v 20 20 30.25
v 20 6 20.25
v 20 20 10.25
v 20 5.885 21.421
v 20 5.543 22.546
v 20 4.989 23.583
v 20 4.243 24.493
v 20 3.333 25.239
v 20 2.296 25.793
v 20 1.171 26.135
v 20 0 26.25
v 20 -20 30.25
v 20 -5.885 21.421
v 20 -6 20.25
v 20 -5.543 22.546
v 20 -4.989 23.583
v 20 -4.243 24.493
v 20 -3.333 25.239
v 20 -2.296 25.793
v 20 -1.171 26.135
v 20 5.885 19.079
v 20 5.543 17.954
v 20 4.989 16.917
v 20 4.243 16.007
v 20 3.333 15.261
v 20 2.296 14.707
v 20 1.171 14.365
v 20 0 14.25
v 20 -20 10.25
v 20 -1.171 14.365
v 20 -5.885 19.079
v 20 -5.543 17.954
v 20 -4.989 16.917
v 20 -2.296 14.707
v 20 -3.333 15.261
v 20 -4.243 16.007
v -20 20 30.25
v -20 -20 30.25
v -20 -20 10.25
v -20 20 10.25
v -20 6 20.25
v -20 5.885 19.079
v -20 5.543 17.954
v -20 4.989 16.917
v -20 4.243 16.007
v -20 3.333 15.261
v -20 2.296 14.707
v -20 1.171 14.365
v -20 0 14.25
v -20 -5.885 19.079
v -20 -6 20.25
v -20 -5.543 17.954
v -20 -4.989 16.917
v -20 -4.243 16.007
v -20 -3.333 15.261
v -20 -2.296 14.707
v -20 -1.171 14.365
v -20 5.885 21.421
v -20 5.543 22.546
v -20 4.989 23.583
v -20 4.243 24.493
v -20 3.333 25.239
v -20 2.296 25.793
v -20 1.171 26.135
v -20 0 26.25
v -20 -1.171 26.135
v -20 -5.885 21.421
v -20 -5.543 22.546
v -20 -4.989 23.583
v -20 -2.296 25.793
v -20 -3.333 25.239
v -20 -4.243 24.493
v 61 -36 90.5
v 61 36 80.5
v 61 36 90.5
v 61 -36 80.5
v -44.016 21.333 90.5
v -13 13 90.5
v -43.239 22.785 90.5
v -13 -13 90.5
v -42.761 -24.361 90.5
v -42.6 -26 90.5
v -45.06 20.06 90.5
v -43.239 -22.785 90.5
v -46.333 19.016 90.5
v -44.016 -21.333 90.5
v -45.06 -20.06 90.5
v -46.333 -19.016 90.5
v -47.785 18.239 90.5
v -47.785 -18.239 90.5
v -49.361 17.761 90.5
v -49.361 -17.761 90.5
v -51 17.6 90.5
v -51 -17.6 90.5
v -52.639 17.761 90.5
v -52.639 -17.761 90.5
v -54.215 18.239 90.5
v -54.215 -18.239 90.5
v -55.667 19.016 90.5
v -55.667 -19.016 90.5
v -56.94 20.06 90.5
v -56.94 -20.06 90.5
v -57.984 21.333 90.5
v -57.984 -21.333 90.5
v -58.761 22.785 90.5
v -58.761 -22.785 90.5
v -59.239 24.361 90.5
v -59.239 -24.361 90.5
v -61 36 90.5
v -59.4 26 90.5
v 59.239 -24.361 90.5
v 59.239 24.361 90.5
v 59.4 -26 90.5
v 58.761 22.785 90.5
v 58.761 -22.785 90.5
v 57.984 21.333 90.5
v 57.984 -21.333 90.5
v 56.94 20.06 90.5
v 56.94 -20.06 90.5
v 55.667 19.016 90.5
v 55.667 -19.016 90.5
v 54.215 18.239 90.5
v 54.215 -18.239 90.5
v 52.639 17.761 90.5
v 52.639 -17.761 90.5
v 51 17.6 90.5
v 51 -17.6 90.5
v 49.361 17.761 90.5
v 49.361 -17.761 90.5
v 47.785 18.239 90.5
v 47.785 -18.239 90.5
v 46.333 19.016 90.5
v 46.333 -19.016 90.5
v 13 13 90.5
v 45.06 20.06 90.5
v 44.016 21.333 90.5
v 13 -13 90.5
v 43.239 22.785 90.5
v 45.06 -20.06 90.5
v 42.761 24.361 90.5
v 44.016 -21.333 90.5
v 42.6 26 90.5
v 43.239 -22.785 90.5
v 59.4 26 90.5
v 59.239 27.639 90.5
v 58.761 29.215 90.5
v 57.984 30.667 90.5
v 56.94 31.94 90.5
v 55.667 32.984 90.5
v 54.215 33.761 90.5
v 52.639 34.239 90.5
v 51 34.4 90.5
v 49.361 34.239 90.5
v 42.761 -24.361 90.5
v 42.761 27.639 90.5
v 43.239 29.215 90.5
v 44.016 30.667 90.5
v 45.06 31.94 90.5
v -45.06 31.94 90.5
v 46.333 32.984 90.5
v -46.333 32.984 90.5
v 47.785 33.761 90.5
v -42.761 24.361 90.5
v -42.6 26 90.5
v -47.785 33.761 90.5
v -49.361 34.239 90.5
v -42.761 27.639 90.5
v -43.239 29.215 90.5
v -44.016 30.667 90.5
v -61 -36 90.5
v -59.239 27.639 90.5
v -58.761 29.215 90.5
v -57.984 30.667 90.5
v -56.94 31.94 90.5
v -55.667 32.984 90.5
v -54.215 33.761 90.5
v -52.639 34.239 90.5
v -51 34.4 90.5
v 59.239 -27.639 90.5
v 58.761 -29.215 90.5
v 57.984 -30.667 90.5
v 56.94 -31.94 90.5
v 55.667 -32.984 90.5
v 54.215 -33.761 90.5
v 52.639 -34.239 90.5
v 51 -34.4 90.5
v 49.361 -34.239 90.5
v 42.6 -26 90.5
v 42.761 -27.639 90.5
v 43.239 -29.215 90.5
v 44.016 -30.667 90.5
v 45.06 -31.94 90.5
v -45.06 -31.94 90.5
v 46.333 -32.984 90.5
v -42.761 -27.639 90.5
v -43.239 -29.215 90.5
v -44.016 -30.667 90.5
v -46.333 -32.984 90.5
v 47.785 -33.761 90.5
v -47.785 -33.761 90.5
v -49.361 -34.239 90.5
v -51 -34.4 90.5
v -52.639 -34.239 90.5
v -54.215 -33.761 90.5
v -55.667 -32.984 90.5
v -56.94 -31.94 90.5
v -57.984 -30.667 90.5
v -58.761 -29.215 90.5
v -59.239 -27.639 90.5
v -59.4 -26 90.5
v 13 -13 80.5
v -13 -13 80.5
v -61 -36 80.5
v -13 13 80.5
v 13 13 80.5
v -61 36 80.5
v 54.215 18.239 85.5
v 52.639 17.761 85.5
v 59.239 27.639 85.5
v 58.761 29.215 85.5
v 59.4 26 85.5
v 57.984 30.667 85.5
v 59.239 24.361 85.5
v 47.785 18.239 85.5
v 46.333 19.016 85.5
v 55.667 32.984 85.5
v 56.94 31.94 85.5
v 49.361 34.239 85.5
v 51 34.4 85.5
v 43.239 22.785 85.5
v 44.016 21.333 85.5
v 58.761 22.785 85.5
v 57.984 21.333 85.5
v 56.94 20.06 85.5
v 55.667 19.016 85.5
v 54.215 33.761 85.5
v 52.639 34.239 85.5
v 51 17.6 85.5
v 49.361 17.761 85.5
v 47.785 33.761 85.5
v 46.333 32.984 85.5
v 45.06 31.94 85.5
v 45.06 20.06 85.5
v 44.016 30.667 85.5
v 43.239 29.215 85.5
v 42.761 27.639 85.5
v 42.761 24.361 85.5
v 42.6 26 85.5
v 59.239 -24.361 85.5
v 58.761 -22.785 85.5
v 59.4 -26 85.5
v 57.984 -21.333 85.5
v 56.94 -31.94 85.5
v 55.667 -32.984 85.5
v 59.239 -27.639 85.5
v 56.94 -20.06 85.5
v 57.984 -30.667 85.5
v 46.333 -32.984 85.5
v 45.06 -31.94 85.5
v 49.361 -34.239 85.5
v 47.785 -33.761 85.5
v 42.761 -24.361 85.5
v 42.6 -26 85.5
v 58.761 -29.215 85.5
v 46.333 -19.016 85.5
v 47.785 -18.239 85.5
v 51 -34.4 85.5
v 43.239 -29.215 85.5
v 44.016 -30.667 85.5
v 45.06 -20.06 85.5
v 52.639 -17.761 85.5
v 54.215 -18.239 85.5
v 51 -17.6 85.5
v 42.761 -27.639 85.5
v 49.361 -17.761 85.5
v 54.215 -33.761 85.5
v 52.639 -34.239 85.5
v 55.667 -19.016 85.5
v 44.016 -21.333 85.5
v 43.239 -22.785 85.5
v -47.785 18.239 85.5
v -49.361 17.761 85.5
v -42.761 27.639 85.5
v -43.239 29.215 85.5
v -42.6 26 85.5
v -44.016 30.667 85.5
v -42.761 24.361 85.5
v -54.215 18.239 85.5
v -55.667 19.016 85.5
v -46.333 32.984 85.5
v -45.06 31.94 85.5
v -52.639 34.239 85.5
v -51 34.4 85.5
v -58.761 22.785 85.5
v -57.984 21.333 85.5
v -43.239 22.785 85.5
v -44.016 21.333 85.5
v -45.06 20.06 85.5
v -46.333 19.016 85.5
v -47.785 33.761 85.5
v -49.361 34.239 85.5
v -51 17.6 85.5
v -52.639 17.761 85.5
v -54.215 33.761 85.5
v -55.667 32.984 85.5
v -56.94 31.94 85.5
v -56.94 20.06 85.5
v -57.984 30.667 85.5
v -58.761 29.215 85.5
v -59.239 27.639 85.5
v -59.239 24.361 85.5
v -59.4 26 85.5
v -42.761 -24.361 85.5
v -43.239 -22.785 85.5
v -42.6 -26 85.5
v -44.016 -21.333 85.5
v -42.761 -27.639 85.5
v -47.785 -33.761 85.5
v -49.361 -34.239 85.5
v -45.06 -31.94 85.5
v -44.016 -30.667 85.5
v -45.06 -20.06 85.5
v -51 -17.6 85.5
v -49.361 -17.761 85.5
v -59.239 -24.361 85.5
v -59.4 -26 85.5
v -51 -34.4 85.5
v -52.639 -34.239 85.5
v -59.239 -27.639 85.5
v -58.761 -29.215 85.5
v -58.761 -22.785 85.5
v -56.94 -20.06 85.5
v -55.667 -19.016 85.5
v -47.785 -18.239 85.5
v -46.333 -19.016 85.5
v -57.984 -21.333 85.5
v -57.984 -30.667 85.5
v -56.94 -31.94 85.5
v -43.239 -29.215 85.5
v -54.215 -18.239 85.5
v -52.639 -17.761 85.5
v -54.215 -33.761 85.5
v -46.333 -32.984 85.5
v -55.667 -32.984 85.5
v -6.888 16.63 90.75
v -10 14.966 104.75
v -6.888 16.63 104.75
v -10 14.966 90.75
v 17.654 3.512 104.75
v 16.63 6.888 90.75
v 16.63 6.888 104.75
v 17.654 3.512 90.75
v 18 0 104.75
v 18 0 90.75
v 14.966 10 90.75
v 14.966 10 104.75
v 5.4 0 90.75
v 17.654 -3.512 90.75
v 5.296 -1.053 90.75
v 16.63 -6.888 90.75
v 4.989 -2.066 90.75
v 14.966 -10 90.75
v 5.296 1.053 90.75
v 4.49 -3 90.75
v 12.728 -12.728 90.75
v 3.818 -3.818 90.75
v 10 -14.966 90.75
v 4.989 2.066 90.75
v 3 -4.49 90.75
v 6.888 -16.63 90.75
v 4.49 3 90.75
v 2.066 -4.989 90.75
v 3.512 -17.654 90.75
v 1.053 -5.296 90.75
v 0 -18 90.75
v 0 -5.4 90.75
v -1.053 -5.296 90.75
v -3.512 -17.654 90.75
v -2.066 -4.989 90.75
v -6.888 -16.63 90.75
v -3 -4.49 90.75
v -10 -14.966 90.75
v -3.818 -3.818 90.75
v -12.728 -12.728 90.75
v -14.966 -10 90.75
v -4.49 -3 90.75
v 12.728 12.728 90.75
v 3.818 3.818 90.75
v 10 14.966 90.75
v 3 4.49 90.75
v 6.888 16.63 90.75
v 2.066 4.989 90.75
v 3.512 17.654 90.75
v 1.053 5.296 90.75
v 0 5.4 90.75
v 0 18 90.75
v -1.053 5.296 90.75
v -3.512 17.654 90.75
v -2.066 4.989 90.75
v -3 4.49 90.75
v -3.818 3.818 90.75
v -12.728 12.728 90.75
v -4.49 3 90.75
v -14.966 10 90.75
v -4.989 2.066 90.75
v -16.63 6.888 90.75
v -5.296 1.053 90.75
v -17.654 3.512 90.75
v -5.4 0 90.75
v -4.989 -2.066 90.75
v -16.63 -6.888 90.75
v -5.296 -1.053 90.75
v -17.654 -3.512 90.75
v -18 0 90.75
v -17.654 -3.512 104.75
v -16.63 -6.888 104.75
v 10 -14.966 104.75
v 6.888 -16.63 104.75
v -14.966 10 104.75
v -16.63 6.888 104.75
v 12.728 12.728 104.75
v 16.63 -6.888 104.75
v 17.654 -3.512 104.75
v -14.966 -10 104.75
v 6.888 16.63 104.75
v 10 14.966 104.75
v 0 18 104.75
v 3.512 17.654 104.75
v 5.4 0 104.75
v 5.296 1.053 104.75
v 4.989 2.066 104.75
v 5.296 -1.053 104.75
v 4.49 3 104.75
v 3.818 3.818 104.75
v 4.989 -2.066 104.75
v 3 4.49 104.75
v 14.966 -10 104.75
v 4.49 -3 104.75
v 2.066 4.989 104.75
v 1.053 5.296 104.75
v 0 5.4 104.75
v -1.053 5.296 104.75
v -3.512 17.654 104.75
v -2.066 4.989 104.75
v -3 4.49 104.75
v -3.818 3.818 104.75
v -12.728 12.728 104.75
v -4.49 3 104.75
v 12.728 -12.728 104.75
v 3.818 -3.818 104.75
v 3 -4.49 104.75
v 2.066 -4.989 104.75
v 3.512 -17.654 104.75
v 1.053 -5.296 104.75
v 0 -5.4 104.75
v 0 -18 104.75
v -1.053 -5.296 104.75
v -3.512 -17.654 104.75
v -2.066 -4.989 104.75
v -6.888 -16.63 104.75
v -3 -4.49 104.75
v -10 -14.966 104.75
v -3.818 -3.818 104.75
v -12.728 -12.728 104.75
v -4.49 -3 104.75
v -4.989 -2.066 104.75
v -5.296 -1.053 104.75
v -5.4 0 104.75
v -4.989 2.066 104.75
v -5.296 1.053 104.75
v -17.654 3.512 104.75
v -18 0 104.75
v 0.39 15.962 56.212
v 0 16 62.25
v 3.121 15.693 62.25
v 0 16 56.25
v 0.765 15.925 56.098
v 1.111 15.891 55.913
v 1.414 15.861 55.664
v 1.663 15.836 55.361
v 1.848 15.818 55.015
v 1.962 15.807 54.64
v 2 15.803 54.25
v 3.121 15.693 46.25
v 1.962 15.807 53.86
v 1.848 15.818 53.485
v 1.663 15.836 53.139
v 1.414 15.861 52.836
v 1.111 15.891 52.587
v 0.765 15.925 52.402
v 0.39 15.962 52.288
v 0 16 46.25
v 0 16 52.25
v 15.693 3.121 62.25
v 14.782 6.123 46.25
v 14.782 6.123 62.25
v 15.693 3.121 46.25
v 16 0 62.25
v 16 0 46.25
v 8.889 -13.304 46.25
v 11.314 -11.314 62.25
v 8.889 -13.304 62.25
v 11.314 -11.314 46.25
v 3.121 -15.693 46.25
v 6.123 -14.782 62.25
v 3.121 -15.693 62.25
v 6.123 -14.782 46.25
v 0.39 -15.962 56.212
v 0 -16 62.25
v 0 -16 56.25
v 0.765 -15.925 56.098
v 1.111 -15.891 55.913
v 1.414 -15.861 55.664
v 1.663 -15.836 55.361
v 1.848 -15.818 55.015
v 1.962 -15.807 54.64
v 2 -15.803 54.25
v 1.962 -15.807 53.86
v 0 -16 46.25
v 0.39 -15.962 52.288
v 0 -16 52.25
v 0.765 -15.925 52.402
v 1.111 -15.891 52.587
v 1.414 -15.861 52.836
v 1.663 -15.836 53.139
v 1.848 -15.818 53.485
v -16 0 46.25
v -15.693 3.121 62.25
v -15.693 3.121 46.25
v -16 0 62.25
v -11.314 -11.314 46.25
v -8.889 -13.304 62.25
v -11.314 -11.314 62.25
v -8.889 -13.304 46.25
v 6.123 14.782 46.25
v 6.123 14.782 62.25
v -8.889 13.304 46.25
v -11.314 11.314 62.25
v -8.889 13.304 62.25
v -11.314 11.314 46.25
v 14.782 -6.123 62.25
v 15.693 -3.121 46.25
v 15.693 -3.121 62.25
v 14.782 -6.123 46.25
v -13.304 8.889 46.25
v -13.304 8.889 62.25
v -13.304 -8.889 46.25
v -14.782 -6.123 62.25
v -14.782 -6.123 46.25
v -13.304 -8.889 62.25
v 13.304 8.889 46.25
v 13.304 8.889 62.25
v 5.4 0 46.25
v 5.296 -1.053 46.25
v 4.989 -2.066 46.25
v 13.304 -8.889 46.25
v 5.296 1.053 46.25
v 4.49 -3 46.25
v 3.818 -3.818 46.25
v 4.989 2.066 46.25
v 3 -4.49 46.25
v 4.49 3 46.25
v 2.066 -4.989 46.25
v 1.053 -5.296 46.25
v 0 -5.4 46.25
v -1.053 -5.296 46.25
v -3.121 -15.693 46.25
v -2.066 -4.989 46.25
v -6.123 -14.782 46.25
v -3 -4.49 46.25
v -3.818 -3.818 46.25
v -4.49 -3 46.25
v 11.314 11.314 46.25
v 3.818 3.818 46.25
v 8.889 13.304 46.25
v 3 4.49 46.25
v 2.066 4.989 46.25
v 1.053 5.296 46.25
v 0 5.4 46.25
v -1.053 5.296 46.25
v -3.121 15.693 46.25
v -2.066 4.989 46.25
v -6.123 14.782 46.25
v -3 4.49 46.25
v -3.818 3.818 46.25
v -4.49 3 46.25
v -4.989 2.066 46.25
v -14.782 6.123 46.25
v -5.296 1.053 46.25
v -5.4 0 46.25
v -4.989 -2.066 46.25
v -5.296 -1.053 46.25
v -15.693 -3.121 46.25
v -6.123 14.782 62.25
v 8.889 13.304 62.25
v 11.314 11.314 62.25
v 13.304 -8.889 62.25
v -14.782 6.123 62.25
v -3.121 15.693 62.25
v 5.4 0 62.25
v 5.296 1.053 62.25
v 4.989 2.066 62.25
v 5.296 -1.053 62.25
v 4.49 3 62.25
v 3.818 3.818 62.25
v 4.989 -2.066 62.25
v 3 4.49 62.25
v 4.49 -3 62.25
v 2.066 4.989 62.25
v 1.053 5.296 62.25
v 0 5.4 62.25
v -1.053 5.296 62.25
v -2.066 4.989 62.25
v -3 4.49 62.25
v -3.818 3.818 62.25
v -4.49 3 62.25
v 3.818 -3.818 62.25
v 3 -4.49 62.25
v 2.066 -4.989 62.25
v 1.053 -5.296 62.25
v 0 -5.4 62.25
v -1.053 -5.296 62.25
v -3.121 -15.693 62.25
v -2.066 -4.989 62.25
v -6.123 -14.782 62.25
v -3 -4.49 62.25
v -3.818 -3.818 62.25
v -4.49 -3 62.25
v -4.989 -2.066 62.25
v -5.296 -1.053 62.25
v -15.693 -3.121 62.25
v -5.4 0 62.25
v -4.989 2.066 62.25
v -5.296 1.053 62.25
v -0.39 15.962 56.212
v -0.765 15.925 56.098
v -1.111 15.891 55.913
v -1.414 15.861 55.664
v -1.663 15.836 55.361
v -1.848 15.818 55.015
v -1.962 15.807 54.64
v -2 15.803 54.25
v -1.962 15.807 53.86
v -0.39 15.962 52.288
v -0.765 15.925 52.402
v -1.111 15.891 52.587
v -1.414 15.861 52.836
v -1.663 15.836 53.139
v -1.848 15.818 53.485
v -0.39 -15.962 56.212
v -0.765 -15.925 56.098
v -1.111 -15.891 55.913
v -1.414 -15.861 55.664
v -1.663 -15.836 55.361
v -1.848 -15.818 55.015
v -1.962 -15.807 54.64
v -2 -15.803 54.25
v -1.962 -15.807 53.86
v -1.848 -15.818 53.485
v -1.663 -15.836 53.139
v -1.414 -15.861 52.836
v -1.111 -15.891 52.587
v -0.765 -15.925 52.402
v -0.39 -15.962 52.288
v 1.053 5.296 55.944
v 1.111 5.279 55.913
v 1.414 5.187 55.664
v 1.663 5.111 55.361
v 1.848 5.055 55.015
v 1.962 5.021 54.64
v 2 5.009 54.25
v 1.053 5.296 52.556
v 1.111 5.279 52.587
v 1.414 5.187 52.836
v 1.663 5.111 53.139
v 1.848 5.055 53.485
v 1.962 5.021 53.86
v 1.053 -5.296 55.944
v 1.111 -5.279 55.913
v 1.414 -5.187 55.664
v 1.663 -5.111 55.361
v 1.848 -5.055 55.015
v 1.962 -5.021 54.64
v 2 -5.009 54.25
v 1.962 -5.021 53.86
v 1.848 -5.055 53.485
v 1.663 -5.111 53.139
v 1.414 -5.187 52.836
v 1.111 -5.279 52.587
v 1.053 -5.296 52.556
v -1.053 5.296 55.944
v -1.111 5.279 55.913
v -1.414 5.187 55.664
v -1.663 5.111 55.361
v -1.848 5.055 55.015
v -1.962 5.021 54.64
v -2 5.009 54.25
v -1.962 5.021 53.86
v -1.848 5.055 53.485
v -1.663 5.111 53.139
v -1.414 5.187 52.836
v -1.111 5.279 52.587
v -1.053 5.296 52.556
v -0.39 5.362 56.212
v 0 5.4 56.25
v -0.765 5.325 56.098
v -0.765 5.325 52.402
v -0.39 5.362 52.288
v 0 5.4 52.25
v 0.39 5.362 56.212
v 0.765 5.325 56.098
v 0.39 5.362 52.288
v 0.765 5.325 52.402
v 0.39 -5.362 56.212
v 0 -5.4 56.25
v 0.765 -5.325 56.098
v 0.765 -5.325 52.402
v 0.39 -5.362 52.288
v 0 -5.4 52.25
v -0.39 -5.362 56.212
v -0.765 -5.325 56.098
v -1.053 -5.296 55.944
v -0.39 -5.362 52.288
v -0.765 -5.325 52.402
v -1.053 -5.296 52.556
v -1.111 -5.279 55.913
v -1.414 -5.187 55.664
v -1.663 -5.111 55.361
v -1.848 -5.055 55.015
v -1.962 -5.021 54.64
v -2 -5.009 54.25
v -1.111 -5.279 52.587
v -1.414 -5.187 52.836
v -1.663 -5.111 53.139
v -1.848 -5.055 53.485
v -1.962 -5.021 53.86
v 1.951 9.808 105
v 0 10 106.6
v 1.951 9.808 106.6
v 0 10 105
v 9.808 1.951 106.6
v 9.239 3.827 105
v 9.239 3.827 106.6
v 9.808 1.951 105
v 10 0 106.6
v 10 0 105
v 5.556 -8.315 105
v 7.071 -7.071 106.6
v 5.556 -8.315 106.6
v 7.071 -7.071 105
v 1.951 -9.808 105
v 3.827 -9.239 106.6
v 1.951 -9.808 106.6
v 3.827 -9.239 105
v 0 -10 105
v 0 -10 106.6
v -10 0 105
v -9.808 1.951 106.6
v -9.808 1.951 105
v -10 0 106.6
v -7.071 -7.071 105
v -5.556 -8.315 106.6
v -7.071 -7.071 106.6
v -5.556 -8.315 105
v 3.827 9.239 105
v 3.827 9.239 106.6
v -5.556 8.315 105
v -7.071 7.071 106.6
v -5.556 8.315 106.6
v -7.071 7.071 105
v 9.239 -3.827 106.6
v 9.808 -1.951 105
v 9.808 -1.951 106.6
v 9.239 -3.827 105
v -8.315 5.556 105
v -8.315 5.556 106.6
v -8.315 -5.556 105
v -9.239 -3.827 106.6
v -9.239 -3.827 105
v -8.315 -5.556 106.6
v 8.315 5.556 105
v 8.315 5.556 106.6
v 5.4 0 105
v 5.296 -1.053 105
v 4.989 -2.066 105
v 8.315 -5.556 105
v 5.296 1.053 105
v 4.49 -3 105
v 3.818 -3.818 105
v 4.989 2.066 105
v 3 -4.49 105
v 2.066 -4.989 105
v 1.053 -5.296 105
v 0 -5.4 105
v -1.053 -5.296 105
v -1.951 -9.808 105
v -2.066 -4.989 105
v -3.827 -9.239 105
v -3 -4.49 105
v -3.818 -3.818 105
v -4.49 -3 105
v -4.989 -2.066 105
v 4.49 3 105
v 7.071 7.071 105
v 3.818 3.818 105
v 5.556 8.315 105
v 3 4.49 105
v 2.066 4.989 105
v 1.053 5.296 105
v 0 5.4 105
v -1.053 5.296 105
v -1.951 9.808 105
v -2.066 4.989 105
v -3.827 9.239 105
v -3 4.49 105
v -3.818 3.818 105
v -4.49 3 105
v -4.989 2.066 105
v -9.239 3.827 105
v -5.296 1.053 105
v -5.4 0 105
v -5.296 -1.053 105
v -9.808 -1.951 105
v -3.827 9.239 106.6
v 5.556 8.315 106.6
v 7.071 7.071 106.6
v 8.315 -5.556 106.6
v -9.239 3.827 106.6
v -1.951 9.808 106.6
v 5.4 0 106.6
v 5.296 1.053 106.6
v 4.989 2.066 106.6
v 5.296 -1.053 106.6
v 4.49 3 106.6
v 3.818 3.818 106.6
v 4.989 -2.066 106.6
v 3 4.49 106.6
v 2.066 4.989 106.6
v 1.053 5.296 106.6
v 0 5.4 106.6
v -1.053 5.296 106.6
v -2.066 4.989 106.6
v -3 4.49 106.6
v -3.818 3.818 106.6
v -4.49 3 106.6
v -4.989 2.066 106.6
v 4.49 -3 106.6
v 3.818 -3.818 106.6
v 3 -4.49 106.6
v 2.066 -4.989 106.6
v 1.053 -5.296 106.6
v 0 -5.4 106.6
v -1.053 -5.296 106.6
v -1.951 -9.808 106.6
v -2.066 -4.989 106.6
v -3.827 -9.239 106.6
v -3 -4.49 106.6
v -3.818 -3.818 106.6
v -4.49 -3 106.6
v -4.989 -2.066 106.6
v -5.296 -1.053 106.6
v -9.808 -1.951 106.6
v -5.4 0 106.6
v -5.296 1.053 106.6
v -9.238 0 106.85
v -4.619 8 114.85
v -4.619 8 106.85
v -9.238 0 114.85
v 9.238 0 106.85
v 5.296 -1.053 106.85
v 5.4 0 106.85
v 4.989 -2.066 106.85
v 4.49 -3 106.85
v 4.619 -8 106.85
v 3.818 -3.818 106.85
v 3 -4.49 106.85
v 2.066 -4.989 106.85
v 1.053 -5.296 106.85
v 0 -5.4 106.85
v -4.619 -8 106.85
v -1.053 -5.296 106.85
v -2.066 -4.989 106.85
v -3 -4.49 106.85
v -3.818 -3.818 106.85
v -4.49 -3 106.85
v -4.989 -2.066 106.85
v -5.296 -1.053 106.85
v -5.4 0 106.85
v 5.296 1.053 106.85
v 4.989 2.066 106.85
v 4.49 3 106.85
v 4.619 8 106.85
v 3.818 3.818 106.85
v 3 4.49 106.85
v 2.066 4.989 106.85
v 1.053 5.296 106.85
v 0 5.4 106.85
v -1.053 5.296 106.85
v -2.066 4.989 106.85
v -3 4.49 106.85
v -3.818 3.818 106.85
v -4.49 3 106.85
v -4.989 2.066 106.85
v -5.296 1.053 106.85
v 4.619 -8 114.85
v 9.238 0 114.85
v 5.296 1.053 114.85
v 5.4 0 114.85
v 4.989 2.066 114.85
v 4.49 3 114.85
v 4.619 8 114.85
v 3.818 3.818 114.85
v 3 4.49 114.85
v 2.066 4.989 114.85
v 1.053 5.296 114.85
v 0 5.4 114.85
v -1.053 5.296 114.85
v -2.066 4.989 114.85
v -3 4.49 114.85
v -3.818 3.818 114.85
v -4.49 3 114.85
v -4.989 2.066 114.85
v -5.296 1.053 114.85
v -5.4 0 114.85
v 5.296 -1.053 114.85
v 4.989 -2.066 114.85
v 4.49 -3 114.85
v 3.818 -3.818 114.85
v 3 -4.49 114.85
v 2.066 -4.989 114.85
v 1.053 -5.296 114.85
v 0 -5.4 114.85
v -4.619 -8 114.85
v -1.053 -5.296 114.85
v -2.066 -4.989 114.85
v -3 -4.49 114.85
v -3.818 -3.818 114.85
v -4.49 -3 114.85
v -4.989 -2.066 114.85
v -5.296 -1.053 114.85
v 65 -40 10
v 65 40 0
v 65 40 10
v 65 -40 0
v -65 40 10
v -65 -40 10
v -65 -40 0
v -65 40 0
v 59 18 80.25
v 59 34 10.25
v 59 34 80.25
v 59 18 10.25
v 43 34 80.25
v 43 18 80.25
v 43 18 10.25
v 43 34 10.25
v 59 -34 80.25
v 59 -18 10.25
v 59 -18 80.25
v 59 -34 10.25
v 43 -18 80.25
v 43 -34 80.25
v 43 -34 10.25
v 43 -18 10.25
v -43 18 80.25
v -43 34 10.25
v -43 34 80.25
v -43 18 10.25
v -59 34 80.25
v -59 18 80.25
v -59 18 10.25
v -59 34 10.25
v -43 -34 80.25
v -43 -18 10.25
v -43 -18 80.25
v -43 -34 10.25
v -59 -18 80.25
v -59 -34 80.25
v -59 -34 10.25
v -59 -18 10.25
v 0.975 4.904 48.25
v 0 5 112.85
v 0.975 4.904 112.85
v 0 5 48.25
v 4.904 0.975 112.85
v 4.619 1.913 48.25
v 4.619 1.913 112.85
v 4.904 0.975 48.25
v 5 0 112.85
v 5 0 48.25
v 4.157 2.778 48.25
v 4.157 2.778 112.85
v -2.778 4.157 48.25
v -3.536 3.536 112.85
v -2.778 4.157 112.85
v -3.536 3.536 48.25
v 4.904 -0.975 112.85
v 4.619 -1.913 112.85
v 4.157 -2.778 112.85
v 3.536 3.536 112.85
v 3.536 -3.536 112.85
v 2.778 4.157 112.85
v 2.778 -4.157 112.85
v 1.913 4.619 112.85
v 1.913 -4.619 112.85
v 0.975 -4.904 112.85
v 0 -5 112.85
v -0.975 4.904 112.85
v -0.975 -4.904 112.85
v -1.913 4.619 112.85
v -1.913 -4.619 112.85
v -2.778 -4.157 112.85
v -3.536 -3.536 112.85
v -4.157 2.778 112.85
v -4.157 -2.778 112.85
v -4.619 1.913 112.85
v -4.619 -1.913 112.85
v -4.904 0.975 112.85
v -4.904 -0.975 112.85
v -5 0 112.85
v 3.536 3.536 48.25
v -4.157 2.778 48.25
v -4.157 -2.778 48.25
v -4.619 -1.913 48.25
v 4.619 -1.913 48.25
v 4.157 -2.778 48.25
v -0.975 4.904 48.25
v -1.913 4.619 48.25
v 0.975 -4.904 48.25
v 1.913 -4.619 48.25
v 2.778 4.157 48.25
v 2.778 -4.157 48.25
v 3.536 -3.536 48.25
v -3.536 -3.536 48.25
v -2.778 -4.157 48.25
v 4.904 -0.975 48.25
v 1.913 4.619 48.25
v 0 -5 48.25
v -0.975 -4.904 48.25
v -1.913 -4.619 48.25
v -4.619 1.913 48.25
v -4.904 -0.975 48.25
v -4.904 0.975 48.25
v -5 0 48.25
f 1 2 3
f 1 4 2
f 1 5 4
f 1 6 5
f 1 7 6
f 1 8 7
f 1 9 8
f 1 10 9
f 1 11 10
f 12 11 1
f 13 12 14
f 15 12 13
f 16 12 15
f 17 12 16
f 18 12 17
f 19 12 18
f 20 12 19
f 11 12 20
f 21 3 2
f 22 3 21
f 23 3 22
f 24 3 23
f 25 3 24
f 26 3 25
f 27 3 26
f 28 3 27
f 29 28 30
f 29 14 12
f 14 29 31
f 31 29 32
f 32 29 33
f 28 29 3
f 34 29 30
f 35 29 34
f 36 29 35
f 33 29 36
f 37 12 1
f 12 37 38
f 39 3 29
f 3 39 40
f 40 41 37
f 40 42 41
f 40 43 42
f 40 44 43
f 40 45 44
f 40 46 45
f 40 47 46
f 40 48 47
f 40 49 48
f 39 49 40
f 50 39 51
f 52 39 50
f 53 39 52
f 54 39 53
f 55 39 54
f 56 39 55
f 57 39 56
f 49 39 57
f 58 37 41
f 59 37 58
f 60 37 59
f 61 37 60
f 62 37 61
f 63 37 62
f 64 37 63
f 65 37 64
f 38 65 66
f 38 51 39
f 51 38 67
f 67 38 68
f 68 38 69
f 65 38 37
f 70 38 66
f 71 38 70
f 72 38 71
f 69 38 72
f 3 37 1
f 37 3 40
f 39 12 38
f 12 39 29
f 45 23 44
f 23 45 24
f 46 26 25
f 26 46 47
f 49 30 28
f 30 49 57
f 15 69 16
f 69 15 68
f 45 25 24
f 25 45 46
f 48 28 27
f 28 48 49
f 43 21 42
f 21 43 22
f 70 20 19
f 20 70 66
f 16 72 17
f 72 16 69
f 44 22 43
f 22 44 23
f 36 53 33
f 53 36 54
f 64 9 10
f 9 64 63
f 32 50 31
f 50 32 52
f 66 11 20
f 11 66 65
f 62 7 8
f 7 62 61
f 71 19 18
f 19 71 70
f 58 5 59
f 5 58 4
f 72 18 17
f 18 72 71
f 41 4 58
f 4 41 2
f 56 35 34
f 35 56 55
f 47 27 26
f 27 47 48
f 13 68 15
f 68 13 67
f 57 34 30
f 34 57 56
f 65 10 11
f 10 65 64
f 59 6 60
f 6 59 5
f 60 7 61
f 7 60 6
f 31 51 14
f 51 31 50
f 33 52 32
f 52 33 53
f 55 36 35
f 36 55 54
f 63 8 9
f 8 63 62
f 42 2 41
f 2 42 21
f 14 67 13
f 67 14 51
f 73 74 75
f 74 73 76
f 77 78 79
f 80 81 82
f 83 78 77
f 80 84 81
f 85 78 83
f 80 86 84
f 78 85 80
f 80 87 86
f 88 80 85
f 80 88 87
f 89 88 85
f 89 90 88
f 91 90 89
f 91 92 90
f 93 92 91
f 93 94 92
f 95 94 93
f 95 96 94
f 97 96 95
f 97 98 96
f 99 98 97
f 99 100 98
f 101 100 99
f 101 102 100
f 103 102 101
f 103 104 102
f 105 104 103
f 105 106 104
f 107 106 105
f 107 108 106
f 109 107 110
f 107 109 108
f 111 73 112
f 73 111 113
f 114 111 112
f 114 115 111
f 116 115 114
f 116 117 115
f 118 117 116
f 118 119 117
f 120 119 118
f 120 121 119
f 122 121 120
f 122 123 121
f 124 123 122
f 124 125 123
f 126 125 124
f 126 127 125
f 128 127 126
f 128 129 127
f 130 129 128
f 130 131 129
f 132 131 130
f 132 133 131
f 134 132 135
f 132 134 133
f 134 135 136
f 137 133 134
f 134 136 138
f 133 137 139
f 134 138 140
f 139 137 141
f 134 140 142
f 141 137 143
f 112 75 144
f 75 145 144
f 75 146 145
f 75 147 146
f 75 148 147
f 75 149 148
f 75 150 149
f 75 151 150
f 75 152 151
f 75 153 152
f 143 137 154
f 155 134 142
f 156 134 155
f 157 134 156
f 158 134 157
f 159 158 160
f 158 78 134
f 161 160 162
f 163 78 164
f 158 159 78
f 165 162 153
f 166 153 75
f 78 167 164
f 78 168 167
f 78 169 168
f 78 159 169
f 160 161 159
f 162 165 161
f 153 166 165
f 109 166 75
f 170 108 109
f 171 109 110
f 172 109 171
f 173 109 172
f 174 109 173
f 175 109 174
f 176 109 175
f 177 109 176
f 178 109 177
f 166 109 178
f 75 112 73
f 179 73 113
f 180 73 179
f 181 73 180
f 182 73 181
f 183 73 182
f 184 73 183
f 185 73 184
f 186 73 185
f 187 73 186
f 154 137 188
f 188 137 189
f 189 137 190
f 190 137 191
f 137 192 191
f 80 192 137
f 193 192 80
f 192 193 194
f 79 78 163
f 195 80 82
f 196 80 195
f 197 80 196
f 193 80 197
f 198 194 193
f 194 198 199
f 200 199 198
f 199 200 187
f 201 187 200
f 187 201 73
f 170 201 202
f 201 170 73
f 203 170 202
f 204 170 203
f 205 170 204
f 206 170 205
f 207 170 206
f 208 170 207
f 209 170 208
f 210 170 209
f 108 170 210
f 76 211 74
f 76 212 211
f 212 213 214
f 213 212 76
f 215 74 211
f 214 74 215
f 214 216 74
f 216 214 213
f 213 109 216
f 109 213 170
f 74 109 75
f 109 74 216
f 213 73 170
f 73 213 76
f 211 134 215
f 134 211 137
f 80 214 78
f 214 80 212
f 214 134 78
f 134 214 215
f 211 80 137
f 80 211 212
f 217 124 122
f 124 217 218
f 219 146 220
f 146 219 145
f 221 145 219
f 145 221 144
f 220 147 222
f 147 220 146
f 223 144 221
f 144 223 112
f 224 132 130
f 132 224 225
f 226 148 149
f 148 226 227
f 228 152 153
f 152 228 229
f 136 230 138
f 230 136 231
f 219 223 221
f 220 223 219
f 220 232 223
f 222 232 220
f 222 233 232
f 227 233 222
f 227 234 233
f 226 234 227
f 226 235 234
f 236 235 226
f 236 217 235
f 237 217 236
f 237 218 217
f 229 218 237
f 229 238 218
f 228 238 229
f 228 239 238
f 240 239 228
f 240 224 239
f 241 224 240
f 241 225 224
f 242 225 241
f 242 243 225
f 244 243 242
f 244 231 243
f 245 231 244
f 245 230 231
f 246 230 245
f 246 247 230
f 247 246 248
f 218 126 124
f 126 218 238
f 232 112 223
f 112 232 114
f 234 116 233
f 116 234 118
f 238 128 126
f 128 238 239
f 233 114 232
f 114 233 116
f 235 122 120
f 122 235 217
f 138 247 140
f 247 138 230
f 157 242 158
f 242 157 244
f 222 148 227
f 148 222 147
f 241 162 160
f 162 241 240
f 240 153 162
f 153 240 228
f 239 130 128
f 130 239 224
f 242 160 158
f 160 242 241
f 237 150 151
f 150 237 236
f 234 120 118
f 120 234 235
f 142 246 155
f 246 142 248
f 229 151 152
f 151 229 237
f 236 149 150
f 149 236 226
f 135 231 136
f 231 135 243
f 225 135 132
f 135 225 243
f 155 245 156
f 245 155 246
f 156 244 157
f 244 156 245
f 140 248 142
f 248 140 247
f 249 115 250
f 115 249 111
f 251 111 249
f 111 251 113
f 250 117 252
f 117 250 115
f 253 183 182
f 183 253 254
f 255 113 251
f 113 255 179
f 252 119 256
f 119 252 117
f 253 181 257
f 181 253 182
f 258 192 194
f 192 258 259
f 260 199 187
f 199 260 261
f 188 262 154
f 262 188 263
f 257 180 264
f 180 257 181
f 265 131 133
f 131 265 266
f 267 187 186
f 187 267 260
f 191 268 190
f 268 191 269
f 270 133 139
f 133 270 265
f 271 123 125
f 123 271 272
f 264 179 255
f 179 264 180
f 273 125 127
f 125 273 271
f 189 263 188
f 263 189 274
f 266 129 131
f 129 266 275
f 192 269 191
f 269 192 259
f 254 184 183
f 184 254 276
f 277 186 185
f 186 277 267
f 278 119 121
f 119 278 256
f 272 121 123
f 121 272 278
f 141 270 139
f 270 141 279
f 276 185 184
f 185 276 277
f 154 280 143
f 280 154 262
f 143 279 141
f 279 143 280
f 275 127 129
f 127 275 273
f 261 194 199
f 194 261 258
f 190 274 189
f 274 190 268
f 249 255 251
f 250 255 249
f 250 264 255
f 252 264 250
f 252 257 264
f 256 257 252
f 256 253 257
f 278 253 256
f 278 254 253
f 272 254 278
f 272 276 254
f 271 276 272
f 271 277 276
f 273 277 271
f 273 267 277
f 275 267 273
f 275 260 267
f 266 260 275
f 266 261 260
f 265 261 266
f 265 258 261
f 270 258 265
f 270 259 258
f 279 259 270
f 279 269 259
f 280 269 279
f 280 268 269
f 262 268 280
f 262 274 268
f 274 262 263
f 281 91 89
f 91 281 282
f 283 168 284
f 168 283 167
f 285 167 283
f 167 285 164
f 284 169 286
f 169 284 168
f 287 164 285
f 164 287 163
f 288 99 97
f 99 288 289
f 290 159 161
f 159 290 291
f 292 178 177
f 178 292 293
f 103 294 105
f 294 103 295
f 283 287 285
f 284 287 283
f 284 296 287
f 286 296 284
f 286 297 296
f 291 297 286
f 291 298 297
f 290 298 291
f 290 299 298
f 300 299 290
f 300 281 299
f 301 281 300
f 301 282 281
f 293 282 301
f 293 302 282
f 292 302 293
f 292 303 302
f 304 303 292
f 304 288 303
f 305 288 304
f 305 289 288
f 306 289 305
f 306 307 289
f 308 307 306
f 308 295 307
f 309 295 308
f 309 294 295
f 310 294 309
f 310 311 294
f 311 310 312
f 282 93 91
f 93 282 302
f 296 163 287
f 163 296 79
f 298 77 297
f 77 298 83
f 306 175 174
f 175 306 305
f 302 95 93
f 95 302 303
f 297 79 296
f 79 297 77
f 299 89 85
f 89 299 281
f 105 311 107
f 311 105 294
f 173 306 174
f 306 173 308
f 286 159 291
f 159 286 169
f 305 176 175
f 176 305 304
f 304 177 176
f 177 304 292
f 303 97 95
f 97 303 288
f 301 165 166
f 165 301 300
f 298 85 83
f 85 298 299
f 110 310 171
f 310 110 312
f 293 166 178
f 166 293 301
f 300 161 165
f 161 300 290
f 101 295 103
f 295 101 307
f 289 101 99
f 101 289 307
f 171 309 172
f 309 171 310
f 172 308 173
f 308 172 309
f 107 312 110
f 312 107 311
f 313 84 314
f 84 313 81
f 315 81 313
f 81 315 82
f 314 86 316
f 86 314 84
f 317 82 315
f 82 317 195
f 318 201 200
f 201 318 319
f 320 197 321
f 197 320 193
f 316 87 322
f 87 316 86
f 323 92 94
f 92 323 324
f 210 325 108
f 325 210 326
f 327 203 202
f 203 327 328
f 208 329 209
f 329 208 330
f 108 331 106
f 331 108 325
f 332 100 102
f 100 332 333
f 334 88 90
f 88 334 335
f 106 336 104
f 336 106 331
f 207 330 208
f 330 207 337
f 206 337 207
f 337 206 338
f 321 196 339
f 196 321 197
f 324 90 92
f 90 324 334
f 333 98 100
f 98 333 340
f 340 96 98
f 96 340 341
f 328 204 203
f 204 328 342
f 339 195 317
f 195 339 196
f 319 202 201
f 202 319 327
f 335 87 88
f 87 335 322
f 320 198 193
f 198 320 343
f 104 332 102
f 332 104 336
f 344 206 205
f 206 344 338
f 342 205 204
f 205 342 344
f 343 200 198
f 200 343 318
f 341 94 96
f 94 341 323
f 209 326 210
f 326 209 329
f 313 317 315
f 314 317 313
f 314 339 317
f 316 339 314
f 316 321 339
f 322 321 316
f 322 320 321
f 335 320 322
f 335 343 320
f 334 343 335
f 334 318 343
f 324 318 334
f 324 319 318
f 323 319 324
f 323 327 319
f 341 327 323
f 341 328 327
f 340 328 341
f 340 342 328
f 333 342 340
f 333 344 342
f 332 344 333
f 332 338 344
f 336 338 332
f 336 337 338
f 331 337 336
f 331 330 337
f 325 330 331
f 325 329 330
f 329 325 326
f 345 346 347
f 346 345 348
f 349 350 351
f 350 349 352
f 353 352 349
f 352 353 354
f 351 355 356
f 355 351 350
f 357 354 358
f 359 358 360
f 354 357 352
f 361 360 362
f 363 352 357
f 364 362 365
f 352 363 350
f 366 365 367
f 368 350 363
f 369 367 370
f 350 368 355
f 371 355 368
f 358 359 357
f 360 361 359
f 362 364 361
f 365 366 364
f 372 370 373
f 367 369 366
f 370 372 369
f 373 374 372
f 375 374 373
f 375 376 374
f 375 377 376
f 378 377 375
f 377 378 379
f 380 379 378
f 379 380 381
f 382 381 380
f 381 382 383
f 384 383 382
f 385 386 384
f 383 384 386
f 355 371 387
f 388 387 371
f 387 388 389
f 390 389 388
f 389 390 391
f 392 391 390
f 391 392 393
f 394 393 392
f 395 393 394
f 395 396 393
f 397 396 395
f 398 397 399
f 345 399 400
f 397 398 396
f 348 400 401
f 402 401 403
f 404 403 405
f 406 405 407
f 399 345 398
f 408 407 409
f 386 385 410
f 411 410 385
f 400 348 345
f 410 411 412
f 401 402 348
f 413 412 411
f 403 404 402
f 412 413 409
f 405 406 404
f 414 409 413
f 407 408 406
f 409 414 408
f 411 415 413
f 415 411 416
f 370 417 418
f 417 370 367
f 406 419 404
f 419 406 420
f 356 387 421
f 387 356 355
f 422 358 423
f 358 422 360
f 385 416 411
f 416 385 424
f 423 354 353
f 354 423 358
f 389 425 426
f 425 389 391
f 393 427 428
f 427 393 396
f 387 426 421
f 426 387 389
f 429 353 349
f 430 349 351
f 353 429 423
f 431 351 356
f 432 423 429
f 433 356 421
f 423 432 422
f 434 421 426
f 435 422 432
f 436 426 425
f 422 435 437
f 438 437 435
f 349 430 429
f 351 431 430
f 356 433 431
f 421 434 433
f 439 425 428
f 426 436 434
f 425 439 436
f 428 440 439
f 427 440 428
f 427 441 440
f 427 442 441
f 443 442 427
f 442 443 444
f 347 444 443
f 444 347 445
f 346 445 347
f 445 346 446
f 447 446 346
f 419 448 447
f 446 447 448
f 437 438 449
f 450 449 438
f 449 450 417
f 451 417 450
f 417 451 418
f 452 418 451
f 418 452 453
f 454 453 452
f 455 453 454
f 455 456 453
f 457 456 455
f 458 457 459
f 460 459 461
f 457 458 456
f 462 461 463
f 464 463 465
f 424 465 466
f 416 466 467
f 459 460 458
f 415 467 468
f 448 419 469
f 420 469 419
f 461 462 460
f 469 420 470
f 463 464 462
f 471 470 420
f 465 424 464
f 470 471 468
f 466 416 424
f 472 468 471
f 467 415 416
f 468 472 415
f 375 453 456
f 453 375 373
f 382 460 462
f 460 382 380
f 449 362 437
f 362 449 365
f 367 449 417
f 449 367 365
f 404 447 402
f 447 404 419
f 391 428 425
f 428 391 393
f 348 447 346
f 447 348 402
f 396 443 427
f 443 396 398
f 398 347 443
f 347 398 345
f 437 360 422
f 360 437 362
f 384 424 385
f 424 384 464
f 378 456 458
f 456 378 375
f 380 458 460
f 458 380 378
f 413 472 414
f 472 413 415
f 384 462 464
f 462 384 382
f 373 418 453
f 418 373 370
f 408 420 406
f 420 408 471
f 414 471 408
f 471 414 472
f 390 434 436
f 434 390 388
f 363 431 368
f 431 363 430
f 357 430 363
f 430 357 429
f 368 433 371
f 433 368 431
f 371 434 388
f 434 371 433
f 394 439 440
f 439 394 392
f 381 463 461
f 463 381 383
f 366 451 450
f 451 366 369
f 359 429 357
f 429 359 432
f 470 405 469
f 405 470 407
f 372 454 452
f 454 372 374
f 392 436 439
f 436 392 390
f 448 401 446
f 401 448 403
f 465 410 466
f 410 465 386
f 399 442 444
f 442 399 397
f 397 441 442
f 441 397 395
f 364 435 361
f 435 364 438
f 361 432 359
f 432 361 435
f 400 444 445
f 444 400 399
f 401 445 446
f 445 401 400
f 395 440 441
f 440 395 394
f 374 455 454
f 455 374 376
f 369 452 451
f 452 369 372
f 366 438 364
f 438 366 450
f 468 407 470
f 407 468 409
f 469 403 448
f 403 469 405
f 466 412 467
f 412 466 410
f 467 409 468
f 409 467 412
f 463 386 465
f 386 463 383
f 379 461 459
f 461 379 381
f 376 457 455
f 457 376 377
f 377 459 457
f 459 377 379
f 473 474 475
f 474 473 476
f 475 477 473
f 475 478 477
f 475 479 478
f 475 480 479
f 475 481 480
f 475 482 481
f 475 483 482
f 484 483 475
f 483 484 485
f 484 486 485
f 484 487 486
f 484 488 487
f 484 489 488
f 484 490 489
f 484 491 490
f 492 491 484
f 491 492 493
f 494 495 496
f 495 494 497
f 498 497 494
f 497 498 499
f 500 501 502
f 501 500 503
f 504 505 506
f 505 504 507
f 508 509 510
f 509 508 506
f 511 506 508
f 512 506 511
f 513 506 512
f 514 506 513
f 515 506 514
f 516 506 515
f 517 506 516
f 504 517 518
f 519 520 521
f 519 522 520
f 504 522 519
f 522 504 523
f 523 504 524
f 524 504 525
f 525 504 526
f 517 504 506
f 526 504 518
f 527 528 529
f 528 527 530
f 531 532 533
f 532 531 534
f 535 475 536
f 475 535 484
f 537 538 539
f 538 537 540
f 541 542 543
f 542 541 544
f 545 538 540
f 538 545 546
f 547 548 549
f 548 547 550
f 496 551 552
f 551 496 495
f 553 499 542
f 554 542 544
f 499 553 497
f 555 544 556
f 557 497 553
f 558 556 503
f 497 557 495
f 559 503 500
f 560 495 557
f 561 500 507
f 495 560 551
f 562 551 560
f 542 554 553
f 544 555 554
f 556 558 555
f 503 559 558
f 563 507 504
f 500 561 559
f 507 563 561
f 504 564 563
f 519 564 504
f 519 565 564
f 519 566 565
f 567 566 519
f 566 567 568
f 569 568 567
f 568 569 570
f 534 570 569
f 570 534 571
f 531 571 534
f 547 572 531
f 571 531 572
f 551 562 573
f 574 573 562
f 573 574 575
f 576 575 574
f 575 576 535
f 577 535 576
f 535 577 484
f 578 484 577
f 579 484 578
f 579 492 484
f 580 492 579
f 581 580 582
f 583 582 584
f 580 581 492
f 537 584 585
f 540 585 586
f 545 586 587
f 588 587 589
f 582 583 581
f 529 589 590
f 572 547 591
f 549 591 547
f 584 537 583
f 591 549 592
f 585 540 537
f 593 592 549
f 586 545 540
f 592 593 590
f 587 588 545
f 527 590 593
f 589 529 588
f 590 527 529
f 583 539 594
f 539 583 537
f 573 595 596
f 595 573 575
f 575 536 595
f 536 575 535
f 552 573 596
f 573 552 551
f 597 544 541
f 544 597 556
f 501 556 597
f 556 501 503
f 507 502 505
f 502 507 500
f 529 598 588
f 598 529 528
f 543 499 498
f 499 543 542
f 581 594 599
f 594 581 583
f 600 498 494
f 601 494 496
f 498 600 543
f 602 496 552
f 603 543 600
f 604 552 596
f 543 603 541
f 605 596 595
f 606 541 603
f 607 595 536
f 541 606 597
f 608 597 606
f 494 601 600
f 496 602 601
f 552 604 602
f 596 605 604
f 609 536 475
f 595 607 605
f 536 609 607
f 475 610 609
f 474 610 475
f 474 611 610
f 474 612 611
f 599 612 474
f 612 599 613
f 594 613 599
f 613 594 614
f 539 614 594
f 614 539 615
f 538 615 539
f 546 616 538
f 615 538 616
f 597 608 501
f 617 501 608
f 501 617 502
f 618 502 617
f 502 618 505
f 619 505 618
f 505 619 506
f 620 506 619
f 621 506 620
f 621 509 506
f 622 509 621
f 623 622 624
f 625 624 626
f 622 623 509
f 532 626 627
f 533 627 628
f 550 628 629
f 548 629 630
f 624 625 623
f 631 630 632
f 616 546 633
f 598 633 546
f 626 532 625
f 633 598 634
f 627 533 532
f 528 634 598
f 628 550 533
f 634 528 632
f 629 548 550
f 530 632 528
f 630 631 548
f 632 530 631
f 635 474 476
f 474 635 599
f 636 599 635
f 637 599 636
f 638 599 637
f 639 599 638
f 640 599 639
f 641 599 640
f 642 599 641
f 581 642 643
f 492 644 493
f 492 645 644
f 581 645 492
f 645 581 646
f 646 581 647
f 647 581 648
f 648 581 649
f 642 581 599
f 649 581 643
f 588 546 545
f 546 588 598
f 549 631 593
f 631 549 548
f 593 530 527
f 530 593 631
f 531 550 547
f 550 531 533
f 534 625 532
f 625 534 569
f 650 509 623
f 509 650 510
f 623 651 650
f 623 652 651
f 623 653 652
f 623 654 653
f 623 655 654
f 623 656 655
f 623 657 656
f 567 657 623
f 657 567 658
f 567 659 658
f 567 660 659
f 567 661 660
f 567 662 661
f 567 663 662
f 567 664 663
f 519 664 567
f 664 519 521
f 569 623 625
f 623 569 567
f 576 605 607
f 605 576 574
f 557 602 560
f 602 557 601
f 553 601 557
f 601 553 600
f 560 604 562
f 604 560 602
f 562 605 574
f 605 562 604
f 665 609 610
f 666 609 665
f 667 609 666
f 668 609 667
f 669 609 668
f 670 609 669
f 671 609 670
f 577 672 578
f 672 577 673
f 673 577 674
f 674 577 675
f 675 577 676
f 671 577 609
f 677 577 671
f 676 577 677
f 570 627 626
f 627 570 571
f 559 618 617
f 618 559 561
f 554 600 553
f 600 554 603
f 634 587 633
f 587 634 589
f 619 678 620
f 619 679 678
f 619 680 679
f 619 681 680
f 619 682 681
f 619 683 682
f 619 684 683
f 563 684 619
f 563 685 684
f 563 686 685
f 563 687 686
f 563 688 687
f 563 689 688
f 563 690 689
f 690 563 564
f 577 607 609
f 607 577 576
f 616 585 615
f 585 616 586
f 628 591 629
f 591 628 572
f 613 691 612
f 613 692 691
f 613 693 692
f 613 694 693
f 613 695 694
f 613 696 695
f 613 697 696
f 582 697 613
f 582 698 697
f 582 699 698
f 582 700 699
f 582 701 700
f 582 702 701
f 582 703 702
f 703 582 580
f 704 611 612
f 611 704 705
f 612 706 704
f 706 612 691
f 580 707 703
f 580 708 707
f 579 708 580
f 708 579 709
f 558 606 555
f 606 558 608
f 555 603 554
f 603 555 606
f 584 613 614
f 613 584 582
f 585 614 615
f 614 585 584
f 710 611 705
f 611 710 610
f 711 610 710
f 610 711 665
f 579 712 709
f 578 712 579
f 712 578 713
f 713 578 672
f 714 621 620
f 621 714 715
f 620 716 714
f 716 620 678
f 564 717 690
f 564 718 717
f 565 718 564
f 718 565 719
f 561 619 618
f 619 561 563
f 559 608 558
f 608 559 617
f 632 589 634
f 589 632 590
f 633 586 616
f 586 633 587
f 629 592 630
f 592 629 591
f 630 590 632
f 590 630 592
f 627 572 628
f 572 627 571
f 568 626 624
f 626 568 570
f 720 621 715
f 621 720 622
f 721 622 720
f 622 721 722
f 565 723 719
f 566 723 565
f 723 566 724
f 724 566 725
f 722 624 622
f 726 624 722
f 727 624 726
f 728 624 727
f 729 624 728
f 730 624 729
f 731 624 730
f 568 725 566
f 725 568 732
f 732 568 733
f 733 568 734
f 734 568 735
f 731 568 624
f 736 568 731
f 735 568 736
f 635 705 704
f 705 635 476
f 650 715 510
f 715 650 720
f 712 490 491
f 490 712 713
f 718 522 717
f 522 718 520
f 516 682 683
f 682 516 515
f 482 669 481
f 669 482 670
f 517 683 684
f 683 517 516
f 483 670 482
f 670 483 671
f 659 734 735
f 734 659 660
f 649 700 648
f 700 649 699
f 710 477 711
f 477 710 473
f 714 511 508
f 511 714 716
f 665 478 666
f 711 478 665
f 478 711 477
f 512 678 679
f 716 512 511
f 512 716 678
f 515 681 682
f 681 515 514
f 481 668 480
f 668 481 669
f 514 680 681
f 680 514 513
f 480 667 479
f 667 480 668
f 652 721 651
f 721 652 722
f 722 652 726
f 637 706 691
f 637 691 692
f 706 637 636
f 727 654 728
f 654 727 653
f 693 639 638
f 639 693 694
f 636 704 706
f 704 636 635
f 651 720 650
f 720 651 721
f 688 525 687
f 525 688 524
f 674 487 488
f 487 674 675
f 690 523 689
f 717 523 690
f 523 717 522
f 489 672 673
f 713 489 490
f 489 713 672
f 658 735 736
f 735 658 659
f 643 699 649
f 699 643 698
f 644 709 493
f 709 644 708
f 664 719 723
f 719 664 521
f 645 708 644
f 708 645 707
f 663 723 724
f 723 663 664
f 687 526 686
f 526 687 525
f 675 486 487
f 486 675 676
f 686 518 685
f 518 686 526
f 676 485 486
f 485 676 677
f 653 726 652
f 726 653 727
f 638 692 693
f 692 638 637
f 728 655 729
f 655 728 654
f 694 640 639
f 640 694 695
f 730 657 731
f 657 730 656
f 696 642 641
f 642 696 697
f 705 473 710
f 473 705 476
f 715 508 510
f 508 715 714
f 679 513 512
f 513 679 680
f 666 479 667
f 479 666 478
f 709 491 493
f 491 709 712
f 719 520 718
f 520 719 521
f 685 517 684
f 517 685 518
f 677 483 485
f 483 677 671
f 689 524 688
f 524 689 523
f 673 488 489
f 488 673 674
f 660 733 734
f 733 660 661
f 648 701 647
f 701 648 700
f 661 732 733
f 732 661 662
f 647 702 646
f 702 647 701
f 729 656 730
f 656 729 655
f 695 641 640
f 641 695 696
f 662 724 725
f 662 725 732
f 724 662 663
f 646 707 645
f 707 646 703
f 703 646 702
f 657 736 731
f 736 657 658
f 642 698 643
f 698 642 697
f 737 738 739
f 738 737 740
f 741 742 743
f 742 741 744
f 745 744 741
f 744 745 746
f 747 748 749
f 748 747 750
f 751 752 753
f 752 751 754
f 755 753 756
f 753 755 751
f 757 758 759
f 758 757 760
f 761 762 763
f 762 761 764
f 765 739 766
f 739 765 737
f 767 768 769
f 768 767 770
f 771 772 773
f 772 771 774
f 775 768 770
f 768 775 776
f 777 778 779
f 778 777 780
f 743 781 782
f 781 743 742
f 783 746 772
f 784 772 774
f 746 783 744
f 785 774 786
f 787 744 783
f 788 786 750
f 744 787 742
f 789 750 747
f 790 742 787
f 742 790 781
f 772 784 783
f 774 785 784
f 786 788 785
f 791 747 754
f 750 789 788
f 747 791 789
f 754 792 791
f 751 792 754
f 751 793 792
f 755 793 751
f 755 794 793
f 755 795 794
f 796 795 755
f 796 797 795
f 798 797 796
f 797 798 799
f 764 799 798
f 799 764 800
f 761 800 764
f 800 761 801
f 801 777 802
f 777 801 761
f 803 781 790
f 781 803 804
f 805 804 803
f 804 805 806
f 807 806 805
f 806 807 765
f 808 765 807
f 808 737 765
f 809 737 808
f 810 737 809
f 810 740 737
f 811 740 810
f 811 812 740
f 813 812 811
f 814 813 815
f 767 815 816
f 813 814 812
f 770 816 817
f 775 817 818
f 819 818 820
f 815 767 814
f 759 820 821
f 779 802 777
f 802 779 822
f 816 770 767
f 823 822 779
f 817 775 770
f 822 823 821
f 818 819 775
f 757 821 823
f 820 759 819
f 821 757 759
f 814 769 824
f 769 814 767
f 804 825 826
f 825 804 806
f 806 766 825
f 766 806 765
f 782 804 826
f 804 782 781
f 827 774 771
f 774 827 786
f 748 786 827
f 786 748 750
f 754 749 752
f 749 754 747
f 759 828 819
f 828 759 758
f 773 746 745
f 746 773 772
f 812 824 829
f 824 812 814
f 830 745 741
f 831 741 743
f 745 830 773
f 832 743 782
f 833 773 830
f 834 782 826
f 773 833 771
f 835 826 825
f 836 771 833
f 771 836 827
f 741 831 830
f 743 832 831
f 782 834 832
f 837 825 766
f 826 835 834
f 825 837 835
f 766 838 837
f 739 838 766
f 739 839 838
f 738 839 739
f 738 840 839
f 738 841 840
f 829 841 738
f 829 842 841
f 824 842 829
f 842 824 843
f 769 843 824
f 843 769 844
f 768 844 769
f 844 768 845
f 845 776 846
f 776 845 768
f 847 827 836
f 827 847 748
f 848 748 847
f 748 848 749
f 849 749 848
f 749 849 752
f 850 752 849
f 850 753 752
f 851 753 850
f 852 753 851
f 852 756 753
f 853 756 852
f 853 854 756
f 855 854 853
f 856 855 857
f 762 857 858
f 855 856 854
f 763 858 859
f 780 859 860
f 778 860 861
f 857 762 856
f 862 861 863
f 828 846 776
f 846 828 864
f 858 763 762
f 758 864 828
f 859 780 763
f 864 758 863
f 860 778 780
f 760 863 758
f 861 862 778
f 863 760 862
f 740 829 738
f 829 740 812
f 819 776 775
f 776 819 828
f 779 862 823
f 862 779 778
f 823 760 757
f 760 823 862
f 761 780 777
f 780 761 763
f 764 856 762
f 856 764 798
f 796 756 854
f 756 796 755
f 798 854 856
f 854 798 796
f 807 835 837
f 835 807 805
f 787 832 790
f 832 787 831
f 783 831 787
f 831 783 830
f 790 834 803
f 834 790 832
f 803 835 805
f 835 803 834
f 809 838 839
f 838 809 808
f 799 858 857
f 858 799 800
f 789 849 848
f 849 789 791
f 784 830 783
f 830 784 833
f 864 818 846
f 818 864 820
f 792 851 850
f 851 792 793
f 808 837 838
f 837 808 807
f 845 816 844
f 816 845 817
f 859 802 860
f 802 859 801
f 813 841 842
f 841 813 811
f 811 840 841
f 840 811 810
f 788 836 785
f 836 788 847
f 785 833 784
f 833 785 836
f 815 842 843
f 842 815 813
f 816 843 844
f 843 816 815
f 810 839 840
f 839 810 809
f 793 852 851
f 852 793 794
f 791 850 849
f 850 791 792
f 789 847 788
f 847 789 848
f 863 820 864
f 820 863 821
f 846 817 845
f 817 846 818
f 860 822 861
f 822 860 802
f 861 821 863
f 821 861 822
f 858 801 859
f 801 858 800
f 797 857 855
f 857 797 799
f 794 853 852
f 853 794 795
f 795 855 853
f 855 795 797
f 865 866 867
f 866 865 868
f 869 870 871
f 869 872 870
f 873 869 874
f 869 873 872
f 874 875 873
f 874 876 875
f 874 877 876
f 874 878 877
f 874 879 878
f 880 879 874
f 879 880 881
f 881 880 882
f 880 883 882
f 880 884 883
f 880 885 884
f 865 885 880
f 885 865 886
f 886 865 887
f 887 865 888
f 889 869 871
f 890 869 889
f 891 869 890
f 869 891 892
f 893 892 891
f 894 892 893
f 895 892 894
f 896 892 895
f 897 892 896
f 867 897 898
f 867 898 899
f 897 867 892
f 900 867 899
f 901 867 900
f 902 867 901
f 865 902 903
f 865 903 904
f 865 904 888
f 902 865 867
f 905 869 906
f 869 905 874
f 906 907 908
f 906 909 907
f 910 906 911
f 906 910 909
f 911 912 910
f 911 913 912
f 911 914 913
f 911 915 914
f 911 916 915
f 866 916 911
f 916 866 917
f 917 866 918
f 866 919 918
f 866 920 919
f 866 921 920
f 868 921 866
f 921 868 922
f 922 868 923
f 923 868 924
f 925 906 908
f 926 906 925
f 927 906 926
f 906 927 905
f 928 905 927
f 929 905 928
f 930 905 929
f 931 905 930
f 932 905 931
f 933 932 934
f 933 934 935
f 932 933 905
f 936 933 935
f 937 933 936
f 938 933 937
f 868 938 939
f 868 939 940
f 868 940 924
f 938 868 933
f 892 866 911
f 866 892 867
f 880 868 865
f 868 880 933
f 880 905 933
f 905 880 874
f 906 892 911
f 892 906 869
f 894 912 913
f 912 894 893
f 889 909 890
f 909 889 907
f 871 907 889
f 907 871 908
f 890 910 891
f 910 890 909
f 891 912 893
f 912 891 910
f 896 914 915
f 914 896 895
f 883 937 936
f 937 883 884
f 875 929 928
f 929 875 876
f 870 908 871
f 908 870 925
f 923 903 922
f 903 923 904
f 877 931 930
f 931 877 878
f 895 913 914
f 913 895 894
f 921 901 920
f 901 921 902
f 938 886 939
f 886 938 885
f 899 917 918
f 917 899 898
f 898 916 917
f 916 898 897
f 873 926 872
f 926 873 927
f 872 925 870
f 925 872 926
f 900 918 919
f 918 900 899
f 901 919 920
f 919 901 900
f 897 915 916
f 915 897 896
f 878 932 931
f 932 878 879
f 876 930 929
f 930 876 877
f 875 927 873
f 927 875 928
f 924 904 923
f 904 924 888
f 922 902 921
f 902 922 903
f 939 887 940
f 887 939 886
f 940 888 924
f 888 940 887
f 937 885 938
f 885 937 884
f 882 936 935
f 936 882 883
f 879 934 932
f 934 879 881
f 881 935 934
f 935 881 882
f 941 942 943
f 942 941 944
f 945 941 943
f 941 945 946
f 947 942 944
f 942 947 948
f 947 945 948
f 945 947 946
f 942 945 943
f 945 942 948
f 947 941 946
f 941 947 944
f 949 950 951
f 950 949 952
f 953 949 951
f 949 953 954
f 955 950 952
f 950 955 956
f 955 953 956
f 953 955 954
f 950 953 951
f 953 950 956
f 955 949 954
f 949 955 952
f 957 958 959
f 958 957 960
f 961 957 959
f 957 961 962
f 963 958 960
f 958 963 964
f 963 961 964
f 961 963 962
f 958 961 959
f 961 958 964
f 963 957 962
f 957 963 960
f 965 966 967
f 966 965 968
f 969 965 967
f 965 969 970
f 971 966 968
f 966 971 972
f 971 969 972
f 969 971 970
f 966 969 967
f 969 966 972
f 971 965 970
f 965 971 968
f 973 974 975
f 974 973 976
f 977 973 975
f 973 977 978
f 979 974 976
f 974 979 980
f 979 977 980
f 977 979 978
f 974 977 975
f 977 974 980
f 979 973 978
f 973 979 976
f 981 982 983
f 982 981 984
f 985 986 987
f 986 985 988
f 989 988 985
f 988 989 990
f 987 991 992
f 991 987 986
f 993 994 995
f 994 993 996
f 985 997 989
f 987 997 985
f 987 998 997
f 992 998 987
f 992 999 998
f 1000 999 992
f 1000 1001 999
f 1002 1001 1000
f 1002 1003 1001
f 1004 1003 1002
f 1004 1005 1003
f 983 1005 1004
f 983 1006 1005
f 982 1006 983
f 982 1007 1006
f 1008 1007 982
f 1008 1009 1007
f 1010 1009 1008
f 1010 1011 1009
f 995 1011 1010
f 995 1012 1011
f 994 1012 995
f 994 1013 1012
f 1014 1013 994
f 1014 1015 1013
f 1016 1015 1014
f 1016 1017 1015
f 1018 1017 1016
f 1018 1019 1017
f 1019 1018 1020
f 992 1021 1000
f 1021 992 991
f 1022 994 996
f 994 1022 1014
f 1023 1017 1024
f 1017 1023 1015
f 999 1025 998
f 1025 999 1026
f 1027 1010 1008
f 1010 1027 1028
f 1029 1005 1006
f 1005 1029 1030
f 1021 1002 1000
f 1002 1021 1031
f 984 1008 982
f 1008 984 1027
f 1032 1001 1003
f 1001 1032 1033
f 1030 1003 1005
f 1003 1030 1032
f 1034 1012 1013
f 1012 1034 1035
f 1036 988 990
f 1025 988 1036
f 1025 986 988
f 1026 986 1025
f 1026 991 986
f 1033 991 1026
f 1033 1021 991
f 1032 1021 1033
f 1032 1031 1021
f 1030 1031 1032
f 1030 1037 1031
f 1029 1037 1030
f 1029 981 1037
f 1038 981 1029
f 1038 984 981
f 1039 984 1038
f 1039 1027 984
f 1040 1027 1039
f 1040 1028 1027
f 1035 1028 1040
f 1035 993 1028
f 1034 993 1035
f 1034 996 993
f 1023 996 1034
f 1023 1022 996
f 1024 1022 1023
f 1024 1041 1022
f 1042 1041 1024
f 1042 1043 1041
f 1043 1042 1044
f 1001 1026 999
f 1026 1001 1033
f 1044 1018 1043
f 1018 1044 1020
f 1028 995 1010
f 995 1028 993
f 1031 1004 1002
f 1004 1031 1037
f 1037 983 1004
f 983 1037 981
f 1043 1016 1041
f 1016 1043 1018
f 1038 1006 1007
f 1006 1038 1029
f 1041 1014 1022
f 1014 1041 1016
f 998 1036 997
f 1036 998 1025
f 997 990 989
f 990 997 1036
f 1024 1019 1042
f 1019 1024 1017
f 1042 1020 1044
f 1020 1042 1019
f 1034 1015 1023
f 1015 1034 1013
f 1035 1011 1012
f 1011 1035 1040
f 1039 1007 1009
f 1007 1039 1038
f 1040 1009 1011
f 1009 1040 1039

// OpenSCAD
$fn = 32;

// ------------------------------------------------------------------------
// Arbor press fixture: screw d10, posts 70 mm, gap 16 mm
// Every part is its own module, assembly() places every instance.
// ------------------------------------------------------------------------

// --- part 1 ---
module press_bed() {
  difference() {
    translate([-65, -40, 0]) cube([130, 80, 10]);
  }
}

// --- part 2 ---
module anvil_block() {
  difference() {
    translate([-20, -20, 0]) cube([40, 40, 20]);
    translate([0, 0, 10]) rotate([0, 90, 0]) cylinder(h = 42, d = 12, center = true);
  }
}

// --- part 3 ---
module press_post_a() {
  translate([-8, -8, 0]) cube([16, 16, 70]);
}

// --- part 4 ---
module press_post_b() {
  translate([-8, -8, 0]) cube([16, 16, 70]);
}

// --- part 5 ---
module press_post_c() {
  translate([-8, -8, 0]) cube([16, 16, 70]);
}

// --- part 6 ---
module press_post_d() {
  translate([-8, -8, 0]) cube([16, 16, 70]);
}

// --- part 7 ---
module press_frame() {
  difference() {
    translate([-61, -36, 0]) cube([122, 72, 10]);
    translate([-13, -13, -1]) cube([26, 26, 12]);
    translate([51, 26, 5]) cylinder(h = 6, d = 16.8);
    translate([51, -26, 5]) cylinder(h = 6, d = 16.8);
    translate([-51, 26, 5]) cylinder(h = 6, d = 16.8);
    translate([-51, -26, 5]) cylinder(h = 6, d = 16.8);
  }
}

// --- part 8 ---
module guide_ring() {
  difference() {
      translate([0, 0, 0]) cylinder(h = 14, d = 36);
      translate([0, 0, -1]) cylinder(h = 16, d = 10.8);
    }
}

// --- part 9 ---
module press_screw() {
  translate([0, 0, -32.3]) cylinder(h = 64.6, d = 10);
}

// --- part 10 ---
module press_head() {
  difference() {
    cylinder(h = 16, d = 32);
    translate([0, 0, -1]) cylinder(h = 18, d = 10.8);
    translate([0, 0, 8]) rotate([90, 0, 0]) cylinder(h = 34, d = 4, center = true);
  }
}

// --- part 11 ---
module nut_washer() {
  difference() {
      translate([0, 0, 0]) cylinder(h = 1.6, d = 20);
      translate([0, 0, -1]) cylinder(h = 3.6, d = 10.8);
    }
}

// --- part 12 ---
module press_nut() {
  difference() {
    linear_extrude(height = 8) polygon(points = [[9.238, 0], [4.619, 8], [-4.619, 8], [-9.238, 0], [-4.619, -8], [4.619, -8]]);
    translate([0, 0, -1]) cylinder(h = 10, d = 10.8);
  }
}

// --- assembly ---
module assembly() {
  color([0.80, 0.24, 0.20]) translate([0, 0, 0]) rotate([0, 0, 0]) press_bed();
  color([0.20, 0.45, 0.75]) translate([0, 0, 10.25]) rotate([0, 0, 0]) anvil_block();
  color([0.25, 0.62, 0.32]) translate([51, 26, 10.25]) rotate([0, 0, 0]) press_post_a();
  color([0.92, 0.70, 0.18]) translate([51, -26, 10.25]) rotate([0, 0, 0]) press_post_b();
  color([0.58, 0.35, 0.70]) translate([-51, 26, 10.25]) rotate([0, 0, 0]) press_post_c();
  color([0.16, 0.66, 0.66]) translate([-51, -26, 10.25]) rotate([0, 0, 0]) press_post_d();
  color([0.85, 0.48, 0.18]) translate([0, 0, 80.5]) rotate([0, 0, 0]) press_frame();
  color([0.55, 0.60, 0.65]) translate([0, 0, 90.75]) rotate([0, 0, 0]) guide_ring();
  color([0.75, 0.30, 0.55]) translate([0, 0, 80.55]) rotate([0, 0, 0]) press_screw();
  color([0.42, 0.52, 0.28]) translate([0, 0, 46.25]) rotate([0, 0, 0]) press_head();
  color([0.80, 0.24, 0.20]) translate([0, 0, 105]) rotate([0, 0, 0]) nut_washer();
  color([0.20, 0.45, 0.75]) translate([0, 0, 106.85]) rotate([0, 0, 0]) press_nut();
}

assembly();
